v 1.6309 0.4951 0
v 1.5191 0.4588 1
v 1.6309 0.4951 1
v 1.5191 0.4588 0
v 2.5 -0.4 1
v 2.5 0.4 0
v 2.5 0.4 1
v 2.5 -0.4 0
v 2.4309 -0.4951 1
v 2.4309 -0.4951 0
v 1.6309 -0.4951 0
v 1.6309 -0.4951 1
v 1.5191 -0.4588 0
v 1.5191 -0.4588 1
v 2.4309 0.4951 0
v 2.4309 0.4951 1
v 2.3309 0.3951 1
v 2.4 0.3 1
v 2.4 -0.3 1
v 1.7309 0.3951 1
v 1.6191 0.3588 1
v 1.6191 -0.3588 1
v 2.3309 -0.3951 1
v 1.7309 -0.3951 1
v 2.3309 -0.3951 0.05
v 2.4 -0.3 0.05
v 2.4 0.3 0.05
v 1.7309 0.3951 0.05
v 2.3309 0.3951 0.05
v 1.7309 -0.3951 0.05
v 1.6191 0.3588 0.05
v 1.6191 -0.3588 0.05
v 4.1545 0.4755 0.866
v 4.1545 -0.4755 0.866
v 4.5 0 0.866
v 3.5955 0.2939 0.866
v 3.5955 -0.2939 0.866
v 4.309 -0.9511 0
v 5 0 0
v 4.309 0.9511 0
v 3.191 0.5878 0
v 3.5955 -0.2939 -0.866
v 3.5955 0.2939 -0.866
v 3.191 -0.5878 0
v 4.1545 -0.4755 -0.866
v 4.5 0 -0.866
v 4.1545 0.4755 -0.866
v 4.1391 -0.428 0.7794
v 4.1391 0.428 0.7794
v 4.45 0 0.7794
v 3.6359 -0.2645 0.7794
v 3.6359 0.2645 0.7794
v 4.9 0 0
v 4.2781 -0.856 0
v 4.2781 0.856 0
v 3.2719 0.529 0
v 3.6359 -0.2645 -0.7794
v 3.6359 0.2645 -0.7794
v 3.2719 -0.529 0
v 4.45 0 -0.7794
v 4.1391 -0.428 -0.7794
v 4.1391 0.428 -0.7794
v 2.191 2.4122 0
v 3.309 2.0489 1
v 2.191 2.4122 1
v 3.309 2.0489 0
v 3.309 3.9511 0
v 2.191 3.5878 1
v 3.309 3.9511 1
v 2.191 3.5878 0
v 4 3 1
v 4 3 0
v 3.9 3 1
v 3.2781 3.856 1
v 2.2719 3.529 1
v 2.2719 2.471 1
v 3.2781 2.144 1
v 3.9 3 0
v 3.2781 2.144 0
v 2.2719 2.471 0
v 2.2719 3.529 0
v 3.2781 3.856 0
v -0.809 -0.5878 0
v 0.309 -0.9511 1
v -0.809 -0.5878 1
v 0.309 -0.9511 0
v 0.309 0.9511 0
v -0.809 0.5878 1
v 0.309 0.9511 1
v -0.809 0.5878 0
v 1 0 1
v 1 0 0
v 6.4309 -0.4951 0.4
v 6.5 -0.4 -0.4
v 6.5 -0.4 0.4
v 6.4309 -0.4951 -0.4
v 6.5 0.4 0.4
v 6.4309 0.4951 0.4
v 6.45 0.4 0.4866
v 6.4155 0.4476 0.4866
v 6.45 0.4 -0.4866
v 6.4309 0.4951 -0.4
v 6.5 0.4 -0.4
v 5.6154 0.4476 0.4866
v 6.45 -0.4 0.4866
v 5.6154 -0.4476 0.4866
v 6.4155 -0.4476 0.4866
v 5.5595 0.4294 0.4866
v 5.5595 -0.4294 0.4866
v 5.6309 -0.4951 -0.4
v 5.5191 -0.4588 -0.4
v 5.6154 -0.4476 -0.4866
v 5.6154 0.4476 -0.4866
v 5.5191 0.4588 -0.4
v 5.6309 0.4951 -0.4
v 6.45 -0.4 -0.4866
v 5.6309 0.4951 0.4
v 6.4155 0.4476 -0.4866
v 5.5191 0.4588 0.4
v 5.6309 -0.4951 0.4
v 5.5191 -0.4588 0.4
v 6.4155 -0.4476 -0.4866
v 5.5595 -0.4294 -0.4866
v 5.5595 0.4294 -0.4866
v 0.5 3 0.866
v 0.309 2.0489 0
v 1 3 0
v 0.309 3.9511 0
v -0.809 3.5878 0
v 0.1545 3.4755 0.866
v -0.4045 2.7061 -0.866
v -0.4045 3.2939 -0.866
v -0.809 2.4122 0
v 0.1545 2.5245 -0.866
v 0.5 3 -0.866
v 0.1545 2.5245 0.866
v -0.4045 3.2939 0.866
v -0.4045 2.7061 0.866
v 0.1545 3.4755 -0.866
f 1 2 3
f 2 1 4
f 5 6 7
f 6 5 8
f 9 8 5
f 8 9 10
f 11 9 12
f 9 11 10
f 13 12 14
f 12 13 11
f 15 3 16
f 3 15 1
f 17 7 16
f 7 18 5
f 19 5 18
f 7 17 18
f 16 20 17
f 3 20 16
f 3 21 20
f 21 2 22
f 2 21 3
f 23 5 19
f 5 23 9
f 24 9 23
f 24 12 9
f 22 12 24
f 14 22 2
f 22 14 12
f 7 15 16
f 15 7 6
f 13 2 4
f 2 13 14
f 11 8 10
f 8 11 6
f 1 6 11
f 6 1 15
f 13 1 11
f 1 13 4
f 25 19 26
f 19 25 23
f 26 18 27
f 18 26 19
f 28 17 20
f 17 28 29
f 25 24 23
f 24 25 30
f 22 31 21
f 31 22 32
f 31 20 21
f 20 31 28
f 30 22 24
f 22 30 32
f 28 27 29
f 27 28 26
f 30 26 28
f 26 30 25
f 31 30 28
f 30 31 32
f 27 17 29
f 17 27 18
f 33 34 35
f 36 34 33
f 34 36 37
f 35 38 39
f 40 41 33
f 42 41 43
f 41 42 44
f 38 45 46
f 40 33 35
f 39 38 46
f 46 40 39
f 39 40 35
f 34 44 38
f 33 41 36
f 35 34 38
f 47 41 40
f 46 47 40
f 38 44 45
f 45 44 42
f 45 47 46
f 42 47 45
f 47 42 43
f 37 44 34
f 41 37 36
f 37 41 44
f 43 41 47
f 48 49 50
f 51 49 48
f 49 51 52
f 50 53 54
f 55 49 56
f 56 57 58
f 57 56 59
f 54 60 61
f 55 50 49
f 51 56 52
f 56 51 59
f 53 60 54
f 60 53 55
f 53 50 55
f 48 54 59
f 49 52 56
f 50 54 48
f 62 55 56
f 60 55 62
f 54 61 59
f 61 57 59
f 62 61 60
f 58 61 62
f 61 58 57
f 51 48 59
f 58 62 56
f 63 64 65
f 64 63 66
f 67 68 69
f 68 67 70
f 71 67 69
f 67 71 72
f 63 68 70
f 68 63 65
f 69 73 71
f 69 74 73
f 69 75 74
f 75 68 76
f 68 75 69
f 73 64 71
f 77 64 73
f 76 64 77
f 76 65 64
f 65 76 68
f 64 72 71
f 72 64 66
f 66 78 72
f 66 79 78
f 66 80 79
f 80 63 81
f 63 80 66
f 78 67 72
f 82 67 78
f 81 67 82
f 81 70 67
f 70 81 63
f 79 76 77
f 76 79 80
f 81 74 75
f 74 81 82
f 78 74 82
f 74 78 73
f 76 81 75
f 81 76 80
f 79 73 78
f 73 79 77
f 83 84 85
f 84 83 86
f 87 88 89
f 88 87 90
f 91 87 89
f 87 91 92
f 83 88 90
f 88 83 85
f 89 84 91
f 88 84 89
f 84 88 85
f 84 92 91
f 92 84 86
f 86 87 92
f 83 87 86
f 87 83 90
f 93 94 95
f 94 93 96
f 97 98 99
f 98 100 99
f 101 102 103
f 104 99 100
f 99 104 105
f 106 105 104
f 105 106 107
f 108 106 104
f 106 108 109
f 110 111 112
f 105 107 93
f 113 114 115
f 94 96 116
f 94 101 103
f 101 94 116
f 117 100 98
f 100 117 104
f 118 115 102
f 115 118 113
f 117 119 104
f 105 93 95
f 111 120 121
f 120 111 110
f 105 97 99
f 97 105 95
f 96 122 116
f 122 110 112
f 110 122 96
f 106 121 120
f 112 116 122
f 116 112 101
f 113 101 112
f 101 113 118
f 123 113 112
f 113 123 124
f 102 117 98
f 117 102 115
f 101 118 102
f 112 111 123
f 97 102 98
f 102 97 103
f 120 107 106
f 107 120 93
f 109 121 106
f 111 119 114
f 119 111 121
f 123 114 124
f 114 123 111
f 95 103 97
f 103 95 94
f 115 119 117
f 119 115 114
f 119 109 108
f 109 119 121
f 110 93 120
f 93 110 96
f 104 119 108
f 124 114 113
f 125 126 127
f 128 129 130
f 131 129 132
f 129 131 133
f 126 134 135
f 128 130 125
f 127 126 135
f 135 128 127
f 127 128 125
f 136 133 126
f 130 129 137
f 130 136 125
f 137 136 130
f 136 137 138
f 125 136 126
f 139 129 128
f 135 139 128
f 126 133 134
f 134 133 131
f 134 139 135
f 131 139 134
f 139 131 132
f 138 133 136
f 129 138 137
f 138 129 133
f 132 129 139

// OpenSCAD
//------------------------------------------------------------------------------------------
// THIS CODE WAS GENERATED WITH GRAPHSCAD
//------------------------------------------------------------------------------------------
// Graphscad is a graphical nodal editor to create .SCAD files
//
// More info : http://graphscad.free.fr
//
// Scad Files created with Graphscad can be edited by graphscad
// Scad Files created with Graphscad can be read by Openscad
//
//------------------------------------------------------------------------------------------
$fn=5;
module fn_overridetest()
{
 function node_cylinder_matrix(i=0,j=0,k=0,l=0,m=0,n=0) = translate([0,0,0]);
 module node_cylinder(i=0,j=0,k=0,l=0,m=0,n=0)
 {
  cylinder(r=1,r1=1,h=1,center=false,$fn=5);
 }
 function node_box_matrix(i=0,j=0,k=0,l=0,m=0,n=0) = translate([2.0,0,0]);
 module node_box(i=0,j=0,k=0,l=0,m=0,n=0)
 {
  translate([2.0,0,0])difference()
  {
   hull()
   {
    translate([-((((1)/2))-(max(0.1,0.00001))),-((((1)/2))-(max(0.1,0.00001))),0]) cylinder(r=max(0.1,0.00001),h=(1),$fn=5);
    translate([-((((1)/2))-(max(0.1,0.00001))), ((((1)/2))-(max(0.1,0.00001))),0]) cylinder(r=max(0.1,0.00001),h=(1),$fn=5);
    translate([ ((((1)/2))-(max(0.1,0.00001))),-((((1)/2))-(max(0.1,0.00001))),0]) cylinder(r=max(0.1,0.00001),h=(1),$fn=5);
    translate([ ((((1)/2))-(max(0.1,0.00001))), ((((1)/2))-(max(0.1,0.00001))),0]) cylinder(r=max(0.1,0.00001),h=(1),$fn=5);
   }
   translate([ 0,0,0.05])hull()
   {
    translate([-((((1)/2))-((max(0.1,0.00001))+(0.1))),-((((1)/2))-((max(0.1,0.00001))+(0.1))),0]) cylinder(r=max(0.1,0.00001),h=(((1))-(0.05)+0.01),$fn=5);
    translate([-((((1)/2))-((max(0.1,0.00001))+(0.1))), ((((1)/2))-((max(0.1,0.00001))+(0.1))),0]) cylinder(r=max(0.1,0.00001),h=(((1))-(0.05)+0.01),$fn=5);
    translate([ ((((1)/2))-((max(0.1,0.00001))+(0.1))),-((((1)/2))-((max(0.1,0.00001))+(0.1))),0]) cylinder(r=max(0.1,0.00001),h=(((1))-(0.05)+0.01),$fn=5);
    translate([ ((((1)/2))-((max(0.1,0.00001))+(0.1))), ((((1)/2))-((max(0.1,0.00001))+(0.1))),0]) cylinder(r=max(0.1,0.00001),h=(((1))-(0.05)+0.01),$fn=5);
   }
  }
 }
 function node_emptysphere_inobject_matrix(i=0,j=0,k=0,l=0,m=0,n=0) = translate([4.0,0,0]);
 module node_emptysphere_inobject(i=0,j=0,k=0,l=0,m=0,n=0)
 {
  translate([4.0,0,0])sphere(r=1-0.1,$fn=5);
 }
 function node_emptysphere_outobject_matrix(i=0,j=0,k=0,l=0,m=0,n=0) = translate([4.0,0,0]);
 module node_emptysphere_outobject(i=0,j=0,k=0,l=0,m=0,n=0)
 {
  translate([4.0,0,0])sphere(r=1,$fn=5);
 }
 function node_emptysphere_matrix(i=0,j=0,k=0,l=0,m=0,n=0) = translate([4.0,0,0]);
 module node_emptysphere(i=0,j=0,k=0,l=0,m=0,n=0)
 {
  translate([4.0,0,0])difference()
  {
   sphere(r=1,$fn=5);
   sphere(r=1-0.1,$fn=5);
  }
 }
 function node_roundcube_matrix(i=0,j=0,k=0,l=0,m=0,n=0) = translate([6.0,0,0]);
 module node_roundcube(i=0,j=0,k=0,l=0,m=0,n=0)
 {
  translate([6.0,0,0])if(0.1>0)
  {
   {
    hull()
    {
     translate([-(((1)/2)-0.1),-(((1)/2)-0.1),-(((1)/2)-0.1)]) sphere(r=0.1,$fn=5);
     translate([-(((1)/2)-0.1),-(((1)/2)-0.1), (((1)/2)-0.1)]) sphere(r=0.1,$fn=5);
     translate([-(((1)/2)-0.1), (((1)/2)-0.1),-(((1)/2)-0.1)]) sphere(r=0.1,$fn=5);
     translate([-(((1)/2)-0.1), (((1)/2)-0.1), (((1)/2)-0.1)]) sphere(r=0.1,$fn=5);
     translate([ (((1)/2)-0.1),-(((1)/2)-0.1),-(((1)/2)-0.1)]) sphere(r=0.1,$fn=5);
     translate([ (((1)/2)-0.1),-(((1)/2)-0.1), (((1)/2)-0.1)]) sphere(r=0.1,$fn=5);
     translate([ (((1)/2)-0.1), (((1)/2)-0.1),-(((1)/2)-0.1)]) sphere(r=0.1,$fn=5);
     translate([ (((1)/2)-0.1), (((1)/2)-0.1), (((1)/2)-0.1)]) sphere(r=0.1,$fn=5);
    }
   }
  }
  else
  {
   translate([ 6.0, 0, 6.0])cube([1,1,1],center=true);
  }
 }
 function node_sphere_matrix(i=0,j=0,k=0,l=0,m=0,n=0) = translate([0.0,3.0,0]);
 module node_sphere(i=0,j=0,k=0,l=0,m=0,n=0)
 {
  translate([0.0,3.0,0]) sphere(r=1,$fn=5);
 }
 function node_tube_inobject_matrix(i=0,j=0,k=0,l=0,m=0,n=0) = translate([3.0,3.0,0]);
 module node_tube_inobject(i=0,j=0,k=0,l=0,m=0,n=0)
 {
  translate([3.0,3.0,0])translate([0,0,-0.001]) cylinder(r=1-(0.1),r1=1-(0.1),h=1+0.002,$fn=5);
 }
 function node_tube_outobject_matrix(i=0,j=0,k=0,l=0,m=0,n=0) = translate([3.0,3.0,0]);
 module node_tube_outobject(i=0,j=0,k=0,l=0,m=0,n=0)
 {
  translate([3.0,3.0,0]) cylinder(r=1,r1=1,h=1,$fn=5);
 }
 function node_tube_holeobject_matrix(i=0,j=0,k=0,l=0,m=0,n=0) = translate([3.0,3.0,0]);
 module node_tube_holeobject(i=0,j=0,k=0,l=0,m=0,n=0)
 {
  translate([3.0,3.0,0])translate([0,0,-0.001]) cylinder(r=(1)+(0)-(0.1),r1=(1)+(0)-(0.1),h=1+0.002,$fn=5);
 }
 function node_tube_matrix(i=0,j=0,k=0,l=0,m=0,n=0) = translate([3.0,3.0,0]);
 module node_tube(i=0,j=0,k=0,l=0,m=0,n=0)
 {
  translate([3.0,3.0,0])difference()
  {
    cylinder(r=1,r1=1,h=1,$fn=5);
   translate([0,0,-0.001]) cylinder(r=(1)+(0)-(0.1),r1=(1)+(0)-(0.1),h=1+0.002,$fn=5);
  }
 }
 function node_circle_matrix(i=0,j=0,k=0,l=0,m=0,n=0) = translate([5.0,3.0,0]);
 module node_circle(i=0,j=0,k=0,l=0,m=0,n=0)
 {
  translate([5.0,3.0,0])circle(r=1,$fn=5);
 }
 node_cylinder();
 node_box();
 node_emptysphere();
 node_roundcube();
 node_sphere();
 node_tube();
 node_circle();
 /*--------------------------------------------------------------------------------------------------------
  Graphscad Utils functions
  This code is Used By Graphscad Nodal Editor to generate SCAD files
 --------------------------------------------------------------------------------------------------------*/
 function det4x4(a) =
 a[0][0]*a[1][1]*a[2][2]*a[3][3] + a[0][0]*a[1][2]*a[2][3]*a[3][1] + a[0][0]*a[1][3]*a[2][1]*a[3][2]
 + a[0][1]*a[1][0]*a[2][3]*a[3][2] + a[0][1]*a[1][2]*a[2][0]*a[3][3] + a[0][1]*a[1][3]*a[2][2]*a[3][0]
 + a[0][2]*a[1][0]*a[2][1]*a[3][3] + a[0][2]*a[1][1]*a[2][3]*a[3][0] + a[0][2]*a[1][3]*a[2][0]*a[3][1]
 + a[0][3]*a[1][0]*a[2][2]*a[3][1] + a[0][3]*a[1][1]*a[2][0]*a[3][2] + a[0][3]*a[1][2]*a[2][1]*a[3][0]
 - a[0][0]*a[1][1]*a[2][3]*a[3][2] - a[0][0]*a[1][2]*a[2][1]*a[3][3] - a[0][0]*a[1][3]*a[2][2]*a[3][1]
 - a[0][1]*a[1][0]*a[2][2]*a[3][3] - a[0][1]*a[1][2]*a[2][3]*a[3][0] - a[0][1]*a[1][3]*a[2][0]*a[3][2]
 - a[0][2]*a[1][0]*a[2][3]*a[3][1] - a[0][2]*a[1][1]*a[2][0]*a[3][3] - a[0][2]*a[1][3]*a[2][1]*a[3][0]
 - a[0][3]*a[1][0]*a[2][1]*a[3][2] - a[0][3]*a[1][1]*a[2][2]*a[3][0] - a[0][3]*a[1][2]*a[2][0]*a[3][1];
 function invb00(a) = a[1][1]*a[2][2]*a[3][3] + a[1][2]*a[2][3]*a[3][1] + a[1][3]*a[2][1]*a[3][2] - a[1][1]*a[2][3]*a[3][2] - a[1][2]*a[2][1]*a[3][3] - a[1][3]*a[2][2]*a[3][1];
 function invb01(a) = a[0][1]*a[2][3]*a[3][2] + a[0][2]*a[2][1]*a[3][3] + a[0][3]*a[2][2]*a[3][1] - a[0][1]*a[2][2]*a[3][3] - a[0][2]*a[2][3]*a[3][1] - a[0][3]*a[2][1]*a[3][2];
 function invb02(a) = a[0][1]*a[1][2]*a[3][3] + a[0][2]*a[1][3]*a[3][1] + a[0][3]*a[1][1]*a[3][2] - a[0][1]*a[1][3]*a[3][2] - a[0][2]*a[1][1]*a[3][3] - a[0][3]*a[1][2]*a[3][1];
 function invb03(a) = a[0][1]*a[1][3]*a[2][2] + a[0][2]*a[1][1]*a[2][3] + a[0][3]*a[1][2]*a[2][1] - a[0][1]*a[1][2]*a[2][3] - a[0][2]*a[1][3]*a[2][1] - a[0][3]*a[1][1]*a[2][2];
 function invb10(a) = a[1][0]*a[2][3]*a[3][2] + a[1][2]*a[2][0]*a[3][3] + a[1][3]*a[2][2]*a[3][0] - a[1][0]*a[2][2]*a[3][3] - a[1][2]*a[2][3]*a[3][0] - a[1][3]*a[2][0]*a[3][2];
 function invb11(a) = a[0][0]*a[2][2]*a[3][3] + a[0][2]*a[2][3]*a[3][0] + a[0][3]*a[2][0]*a[3][2] - a[0][0]*a[2][3]*a[3][2] - a[0][2]*a[2][0]*a[3][3] - a[0][3]*a[2][2]*a[3][0];
 function invb12(a) = a[0][0]*a[1][3]*a[3][2] + a[0][2]*a[1][0]*a[3][3] + a[0][3]*a[1][2]*a[3][0] - a[0][0]*a[1][2]*a[3][3] - a[0][2]*a[1][3]*a[3][0] - a[0][3]*a[1][0]*a[3][2];
 function invb13(a) = a[0][0]*a[1][2]*a[2][3] + a[0][2]*a[1][3]*a[2][0] + a[0][3]*a[1][0]*a[2][2] - a[0][0]*a[1][3]*a[2][2] - a[0][2]*a[1][0]*a[2][3] - a[0][3]*a[1][2]*a[2][0];
 function invb20(a) = a[1][0]*a[2][1]*a[3][3] + a[1][1]*a[2][3]*a[3][0] + a[1][3]*a[2][0]*a[3][1] - a[1][0]*a[2][3]*a[3][1] - a[1][1]*a[2][0]*a[3][3] - a[1][3]*a[2][1]*a[3][0];
 function invb21(a) = a[0][0]*a[2][3]*a[3][1] + a[0][1]*a[2][0]*a[3][3] + a[0][3]*a[2][1]*a[3][0] - a[0][0]*a[2][1]*a[3][3] - a[0][1]*a[2][3]*a[3][0] - a[0][3]*a[2][0]*a[3][1];
 function invb22(a) = a[0][0]*a[1][1]*a[3][3] + a[0][1]*a[1][3]*a[3][0] + a[0][3]*a[1][0]*a[3][1] - a[0][0]*a[1][3]*a[3][1] - a[0][1]*a[1][0]*a[3][3] - a[0][3]*a[1][1]*a[3][0];
 function invb23(a) = a[0][0]*a[1][3]*a[2][1] + a[0][1]*a[1][0]*a[2][3] + a[0][3]*a[1][1]*a[2][0] - a[0][0]*a[1][1]*a[2][3] - a[0][1]*a[1][3]*a[2][0] - a[0][3]*a[1][0]*a[2][1];
 function invb30(a) = a[1][0]*a[2][2]*a[3][1] + a[1][1]*a[2][0]*a[3][2] + a[1][2]*a[2][1]*a[3][0] - a[1][0]*a[2][1]*a[3][2] - a[1][1]*a[2][2]*a[3][0] - a[1][2]*a[2][0]*a[3][1];
 function invb31(a) = a[0][0]*a[2][1]*a[3][2] + a[0][1]*a[2][2]*a[3][0] + a[0][2]*a[2][0]*a[3][1] - a[0][0]*a[2][2]*a[3][1] - a[0][1]*a[2][0]*a[3][2] - a[0][2]*a[2][1]*a[3][0];
 function invb32(a) = a[0][0]*a[1][2]*a[3][1] + a[0][1]*a[1][0]*a[3][2] + a[0][2]*a[1][1]*a[3][0] - a[0][0]*a[1][1]*a[3][2] - a[0][1]*a[1][2]*a[3][0] - a[0][2]*a[1][0]*a[3][1];
 function invb33(a) = a[0][0]*a[1][1]*a[2][2] + a[0][1]*a[1][2]*a[2][0] + a[0][2]*a[1][0]*a[2][1] - a[0][0]*a[1][2]*a[2][1] - a[0][1]*a[1][0]*a[2][2] - a[0][2]*a[1][1]*a[2][0];
 function inv4x4(a)= (1/det4x4(a))*[
 [invb00(a),invb01(a),invb02(a),invb03(a)],
 [invb10(a),invb11(a),invb12(a),invb13(a)],
 [invb20(a),invb21(a),invb22(a),invb23(a)],
 [invb30(a),invb31(a),invb32(a),invb33(a)]];
 function onlytranslate(a)=  [
                        [1,0,0,a[0][3]],
                        [0,1,0,a[1][3]],
                        [0,0,1,a[2][3]],
                        [0,0,0,1]];
 function negonlytranslate(a)=[
                        [1,0,0,-a[0][3]],
                        [0,1,0,-a[1][3]],
                        [0,0,1,-a[2][3]],
                        [0,0,0,1]];
 function lookatvec(t,parentmat) = [t[0]-parentmat[0][3],
                                 t[1]-parentmat[1][3],
                                 t[2]-parentmat[2][3]];
 /*
              rx = '0'
              ry = 'acos('+tz+'/norm(['+tx+','+ty+','+tz+']))'
              rz = 'atan2('+ty+','+tx+')'
 */
 function lookatrot(t,parentmat) = [0,
                                 acos((t[2]-parentmat[2][3])/norm(lookatvec(t,parentmat))),
                                 atan2(t[1]-parentmat[1][3],t[0]-parentmat[0][3])];
 function gettranslation(m) = [m[0][3],m[1][3],m[2][3]];
 function vectormulmatrix(v,m) = m*v;
 function vectorlength(v) = norm(v);
 function vectorx(v) = v[0];
 function vectory(v) = v[1];
 function vectorz(v) = v[2];
 function vectoradd(a,b) = (a+b);
 function vectorsub(a,b) = (a-b);
 function vectormul(a,b) = (a*b);
 function vectordiv(a,b) = (a*(1/b));
 function scale(v)=[[v[0],0,0,0],
                    [0,v[1],0,0],
                    [0,0,v[2],0],
                    [0,0,0,1]];
 function rotatex(a)=[[1,0,0,0],
                      [0,cos(a),-sin(a),0],
                      [0,sin(a),cos(a),0],
                      [0,0,0,1]];
 function rotatey(a)=[[cos(a),0,sin(a),0],
                      [0,1,0,0],
                      [-sin(a),0,cos(a),0],
                      [0,0,0,1]];
 function rotatez(a)=[[cos(a),-sin(a),0,0],
                      [sin(a),cos(a),0,0],
                      [0,0,1,0],
                      [0,0,0,1]];
 function rotatea(c,s,l,m,n)=[[l*l*(1-c)+c,m*l*(1-c)-n*s,n*l*(1-c)+m*s,0],
                              [l*m*(1-c)+n*s,m*m*(1-c)+c,n*m*(1-c)-l*s,0],
                              [l*n*(1-c)-m*s,m*n*(1-c)+l*s,n*n*(1-c)+c,0],
                              [0,0,0,1]];
 function rotateanv(a,nv)=rotatea(cos(a),sin(a),nv[0],nv[1],nv[2]);
 function rotate(a,v, normV=true)=(v==undef)?rotatez(a[2])*rotatey(a[1])*rotatex(a[0]):
                      normV ? rotateanv(a,v/sqrt(v*v)) : rotateanv(a,v);
 function translate(v)=[[1,0,0,v[0]],
                        [0,1,0,v[1]],
                        [0,0,1,v[2]],
                        [0,0,0,1]];
 function mirrorabc(a,b,c)=[[1-2*a*a,-2*a*b,-2*a*c,0],
                            [-2*a*b,1-2*b*b,-2*b*c,0],
                            [-2*a*c,-2*b*c,1-2*c*c,0],
                            [0,0,0,1]];
 function mirrornv(nv)=mirrorabc(nv[0],nv[1],nv[2]);
 function mirror(v)=mirrornv(v/sqrt(v*v));
}
fn_overridetest();


/*BEGINGRAPHSCAD{
    "nodes": [
        {
            "name": "node_cylinder",
            "inputplugs": [
                {
                    "alias": "top radius",
                    "tip": "top radius of cynlinder",
                    "type": "str",
                    "name": "radius",
                    "value": "1"
                },
                {
                    "alias": "bottom radius",
                    "tip": "bottom radius of cynlinder",
                    "type": "str",
                    "name": "radius2",
                    "value": ""
                },
                {
                    "tip": "height of cylinder",
                    "type": "str",
                    "name": "height",
                    "value": "1"
                },
                {
                    "tip": "centering of cylinder (on Z axis)",
                    "type": "str",
                    "name": "center",
                    "value": "false",
                    "combo": [
                        "true",
                        "false"
                    ]
                },
                {
                    "tip": "x translation of output object",
                    "type": "str",
                    "name": "tx",
                    "value": "0"
                },
                {
                    "tip": "y translation of output object",
                    "type": "str",
                    "name": "ty",
                    "value": "0"
                },
                {
                    "tip": "z translation of output object",
                    "type": "str",
                    "name": "tz",
                    "value": "0"
                },
                {
                    "tip": "",
                    "type": "str",
                    "name": "$fn",
                    "value": ""
                }
            ],
            "typename": "Node_cylinder",
            "version": 1,
            "y": -330.5850439882698,
            "x": -317.065982404692
        },
        {
            "name": "node_globalsettings",
            "inputplugs": [
                {
                    "tip": " the minimum angle for a fragment",
                    "type": "str",
                    "name": "$fa",
                    "value": ""
                },
                {
                    "tip": "minimum size of a fragment",
                    "type": "str",
                    "name": "$fs",
                    "value": ""
                },
                {
                    "tip": "When this variable has a value greater than zero, $fa and $fs are ignored and full circle is rendered using this number of fragments",
                    "type": "str",
                    "name": "$fn",
                    "value": "5"
                },
                {
                    "tip": "viewport rotation",
                    "type": "str",
                    "name": "$vpr",
                    "value": ""
                },
                {
                    "tip": "viewport translation",
                    "type": "str",
                    "name": "$vpt",
                    "value": ""
                },
                {
                    "tip": "viewport camera distance",
                    "type": "str",
                    "name": "$vpd",
                    "value": ""
                },
                {
                    "tip": "The $t variable is used for animation",
                    "type": "str",
                    "name": "$t",
                    "value": ""
                }
            ],
            "typename": "Node_globalsettings",
            "version": 1,
            "y": -186.40715542521997,
            "x": -761.0536656891495
        },
        {
            "name": "node_box",
            "inputplugs": [
                {
                    "tip": "x size of box",
                    "type": "str",
                    "name": "sizex",
                    "value": "1"
                },
                {
                    "tip": "y size of box",
                    "type": "str",
                    "name": "sizey",
                    "value": "1"
                },
                {
                    "tip": "z size of box",
                    "type": "str",
                    "name": "sizez",
                    "value": "1"
                },
                {
                    "tip": "x translation of box",
                    "type": "str",
                    "name": "tx",
                    "value": "2.0"
                },
                {
                    "tip": "y translation of box",
                    "type": "str",
                    "name": "ty",
                    "value": "0"
                },
                {
                    "tip": "z translation of box",
                    "type": "str",
                    "name": "tz",
                    "value": "0"
                },
                {
                    "tip": "radius of corner rounding",
                    "type": "str",
                    "name": "rounding",
                    "value": "0.1"
                },
                {
                    "alias": "thickness",
                    "tip": "thickness of box",
                    "type": "str",
                    "name": "tickness",
                    "value": "0.1"
                },
                {
                    "tip": "the thickness of the bottom of the box",
                    "type": "str",
                    "name": "interiorheight",
                    "value": "0.05"
                },
                {
                    "type": "str",
                    "name": "$fn",
                    "value": ""
                },
                {
                    "type": "str",
                    "name": "center",
                    "value": "true",
                    "combo": [
                        "true",
                        "false"
                    ]
                }
            ],
            "typename": "Node_box",
            "version": 1,
            "y": -75.36363636363636,
            "x": -312.39442815249276
        },
        {
            "name": "node_emptysphere",
            "inputplugs": [
                {
                    "tip": "radius of sphere",
                    "type": "str",
                    "name": "radius",
                    "value": "1"
                },
                {
                    "tip": "x translation of output object",
                    "type": "str",
                    "name": "tx",
                    "value": "4.0"
                },
                {
                    "tip": "y translation of output object",
                    "type": "str",
                    "name": "ty",
                    "value": "0"
                },
                {
                    "tip": "z translation of output object",
                    "type": "str",
                    "name": "tz",
                    "value": "0"
                },
                {
                    "tip": "thickness of empty sphere",
                    "type": "str",
                    "name": "tickness",
                    "value": "0.1"
                },
                {
                    "tip": "",
                    "type": "str",
                    "name": "$fn",
                    "value": ""
                }
            ],
            "typename": "Node_emptysphere",
            "version": 1,
            "y": -307.92651928152463,
            "x": -81.8809195381233
        },
        {
            "name": "node_roundcube",
            "inputplugs": [
                {
                    "type": "str",
                    "name": "sizex",
                    "value": "1"
                },
                {
                    "type": "str",
                    "name": "sizey",
                    "value": "1"
                },
                {
                    "type": "str",
                    "name": "sizez",
                    "value": "1"
                },
                {
                    "type": "str",
                    "name": "tx",
                    "value": "6.0"
                },
                {
                    "type": "str",
                    "name": "ty",
                    "value": "0"
                },
                {
                    "type": "str",
                    "name": "tz",
                    "value": "0"
                },
                {
                    "type": "str",
                    "name": "rounding",
                    "value": "0.1"
                },
                {
                    "type": "str",
                    "name": "$fn",
                    "value": ""
                },
                {
                    "type": "str",
                    "name": "center",
                    "value": "true",
                    "combo": [
                        "true",
                        "false"
                    ]
                }
            ],
            "typename": "Node_roundcube",
            "version": 1,
            "y": -60.438263233137434,
            "x": -60.32631176686226
        },
        {
            "name": "node_sphere",
            "inputplugs": [
                {
                    "tip": "radius of sphere",
                    "type": "str",
                    "name": "radius",
                    "value": "1"
                },
                {
                    "tip": "x translation",
                    "type": "str",
                    "name": "tx",
                    "value": "0.0"
                },
                {
                    "tip": "y translation",
                    "type": "str",
                    "name": "ty",
                    "value": "3.0"
                },
                {
                    "tip": "z translation",
                    "type": "str",
                    "name": "tz",
                    "value": "0"
                },
                {
                    "type": "str",
                    "name": "$fn",
                    "value": ""
                }
            ],
            "typename": "Node_sphere",
            "version": 1,
            "y": -292.16852991202325,
            "x": 181.1093022360703
        },
        {
            "name": "node_tube",
            "inputplugs": [
                {
                    "type": "str",
                    "name": "radius",
                    "value": "1"
                },
                {
                    "type": "str",
                    "name": "radius2",
                    "value": ""
                },
                {
                    "type": "str",
                    "name": "height",
                    "value": "1"
                },
                {
                    "type": "str",
                    "name": "tx",
                    "value": "3.0"
                },
                {
                    "type": "str",
                    "name": "ty",
                    "value": "3.0"
                },
                {
                    "type": "str",
                    "name": "tz",
                    "value": "0"
                },
                {
                    "alias": "thickness",
                    "type": "str",
                    "name": "tickness",
                    "value": "0.1"
                },
                {
                    "type": "str",
                    "name": "holemargin",
                    "value": "0"
                },
                {
                    "type": "str",
                    "name": "$fn",
                    "value": ""
                }
            ],
            "typename": "Node_tube",
            "version": 1,
            "y": -68.89767947214062,
            "x": 191.22261601906158
        },
        {
            "name": "node_circle",
            "inputplugs": [
                {
                    "tip": "radius of circle",
                    "type": "str",
                    "name": "radius",
                    "value": "1"
                },
                {
                    "tip": "x translation of circle",
                    "type": "str",
                    "name": "tx",
                    "value": "5.0"
                },
                {
                    "tip": "y translation of circle",
                    "type": "str",
                    "name": "ty",
                    "value": "3.0"
                },
                {
                    "tip": "z translation of circle",
                    "type": "str",
                    "name": "tz",
                    "value": "0"
                },
                {
                    "type": "str",
                    "name": "$fn",
                    "value": ""
                }
            ],
            "typename": "Node_circle",
            "version": 1,
            "y": -272.7198495601171,
            "x": 382.59763068181815
        },
        {
            "name": "node_comment",
            "inputplugs": [
                {
                    "tip": "comment string to display on background",
                    "type": "str",
                    "name": "comment",
                    "value": "this example show that you can leave $fn blank on\nnodes, and use global settings to set it\n"
                }
            ],
            "typename": "Node_comment",
            "version": 1,
            "y": -345.068940469208,
            "x": -895.5696420454543
        }
    ],
    "version": 2
}ENDGRAPHSCAD*/
